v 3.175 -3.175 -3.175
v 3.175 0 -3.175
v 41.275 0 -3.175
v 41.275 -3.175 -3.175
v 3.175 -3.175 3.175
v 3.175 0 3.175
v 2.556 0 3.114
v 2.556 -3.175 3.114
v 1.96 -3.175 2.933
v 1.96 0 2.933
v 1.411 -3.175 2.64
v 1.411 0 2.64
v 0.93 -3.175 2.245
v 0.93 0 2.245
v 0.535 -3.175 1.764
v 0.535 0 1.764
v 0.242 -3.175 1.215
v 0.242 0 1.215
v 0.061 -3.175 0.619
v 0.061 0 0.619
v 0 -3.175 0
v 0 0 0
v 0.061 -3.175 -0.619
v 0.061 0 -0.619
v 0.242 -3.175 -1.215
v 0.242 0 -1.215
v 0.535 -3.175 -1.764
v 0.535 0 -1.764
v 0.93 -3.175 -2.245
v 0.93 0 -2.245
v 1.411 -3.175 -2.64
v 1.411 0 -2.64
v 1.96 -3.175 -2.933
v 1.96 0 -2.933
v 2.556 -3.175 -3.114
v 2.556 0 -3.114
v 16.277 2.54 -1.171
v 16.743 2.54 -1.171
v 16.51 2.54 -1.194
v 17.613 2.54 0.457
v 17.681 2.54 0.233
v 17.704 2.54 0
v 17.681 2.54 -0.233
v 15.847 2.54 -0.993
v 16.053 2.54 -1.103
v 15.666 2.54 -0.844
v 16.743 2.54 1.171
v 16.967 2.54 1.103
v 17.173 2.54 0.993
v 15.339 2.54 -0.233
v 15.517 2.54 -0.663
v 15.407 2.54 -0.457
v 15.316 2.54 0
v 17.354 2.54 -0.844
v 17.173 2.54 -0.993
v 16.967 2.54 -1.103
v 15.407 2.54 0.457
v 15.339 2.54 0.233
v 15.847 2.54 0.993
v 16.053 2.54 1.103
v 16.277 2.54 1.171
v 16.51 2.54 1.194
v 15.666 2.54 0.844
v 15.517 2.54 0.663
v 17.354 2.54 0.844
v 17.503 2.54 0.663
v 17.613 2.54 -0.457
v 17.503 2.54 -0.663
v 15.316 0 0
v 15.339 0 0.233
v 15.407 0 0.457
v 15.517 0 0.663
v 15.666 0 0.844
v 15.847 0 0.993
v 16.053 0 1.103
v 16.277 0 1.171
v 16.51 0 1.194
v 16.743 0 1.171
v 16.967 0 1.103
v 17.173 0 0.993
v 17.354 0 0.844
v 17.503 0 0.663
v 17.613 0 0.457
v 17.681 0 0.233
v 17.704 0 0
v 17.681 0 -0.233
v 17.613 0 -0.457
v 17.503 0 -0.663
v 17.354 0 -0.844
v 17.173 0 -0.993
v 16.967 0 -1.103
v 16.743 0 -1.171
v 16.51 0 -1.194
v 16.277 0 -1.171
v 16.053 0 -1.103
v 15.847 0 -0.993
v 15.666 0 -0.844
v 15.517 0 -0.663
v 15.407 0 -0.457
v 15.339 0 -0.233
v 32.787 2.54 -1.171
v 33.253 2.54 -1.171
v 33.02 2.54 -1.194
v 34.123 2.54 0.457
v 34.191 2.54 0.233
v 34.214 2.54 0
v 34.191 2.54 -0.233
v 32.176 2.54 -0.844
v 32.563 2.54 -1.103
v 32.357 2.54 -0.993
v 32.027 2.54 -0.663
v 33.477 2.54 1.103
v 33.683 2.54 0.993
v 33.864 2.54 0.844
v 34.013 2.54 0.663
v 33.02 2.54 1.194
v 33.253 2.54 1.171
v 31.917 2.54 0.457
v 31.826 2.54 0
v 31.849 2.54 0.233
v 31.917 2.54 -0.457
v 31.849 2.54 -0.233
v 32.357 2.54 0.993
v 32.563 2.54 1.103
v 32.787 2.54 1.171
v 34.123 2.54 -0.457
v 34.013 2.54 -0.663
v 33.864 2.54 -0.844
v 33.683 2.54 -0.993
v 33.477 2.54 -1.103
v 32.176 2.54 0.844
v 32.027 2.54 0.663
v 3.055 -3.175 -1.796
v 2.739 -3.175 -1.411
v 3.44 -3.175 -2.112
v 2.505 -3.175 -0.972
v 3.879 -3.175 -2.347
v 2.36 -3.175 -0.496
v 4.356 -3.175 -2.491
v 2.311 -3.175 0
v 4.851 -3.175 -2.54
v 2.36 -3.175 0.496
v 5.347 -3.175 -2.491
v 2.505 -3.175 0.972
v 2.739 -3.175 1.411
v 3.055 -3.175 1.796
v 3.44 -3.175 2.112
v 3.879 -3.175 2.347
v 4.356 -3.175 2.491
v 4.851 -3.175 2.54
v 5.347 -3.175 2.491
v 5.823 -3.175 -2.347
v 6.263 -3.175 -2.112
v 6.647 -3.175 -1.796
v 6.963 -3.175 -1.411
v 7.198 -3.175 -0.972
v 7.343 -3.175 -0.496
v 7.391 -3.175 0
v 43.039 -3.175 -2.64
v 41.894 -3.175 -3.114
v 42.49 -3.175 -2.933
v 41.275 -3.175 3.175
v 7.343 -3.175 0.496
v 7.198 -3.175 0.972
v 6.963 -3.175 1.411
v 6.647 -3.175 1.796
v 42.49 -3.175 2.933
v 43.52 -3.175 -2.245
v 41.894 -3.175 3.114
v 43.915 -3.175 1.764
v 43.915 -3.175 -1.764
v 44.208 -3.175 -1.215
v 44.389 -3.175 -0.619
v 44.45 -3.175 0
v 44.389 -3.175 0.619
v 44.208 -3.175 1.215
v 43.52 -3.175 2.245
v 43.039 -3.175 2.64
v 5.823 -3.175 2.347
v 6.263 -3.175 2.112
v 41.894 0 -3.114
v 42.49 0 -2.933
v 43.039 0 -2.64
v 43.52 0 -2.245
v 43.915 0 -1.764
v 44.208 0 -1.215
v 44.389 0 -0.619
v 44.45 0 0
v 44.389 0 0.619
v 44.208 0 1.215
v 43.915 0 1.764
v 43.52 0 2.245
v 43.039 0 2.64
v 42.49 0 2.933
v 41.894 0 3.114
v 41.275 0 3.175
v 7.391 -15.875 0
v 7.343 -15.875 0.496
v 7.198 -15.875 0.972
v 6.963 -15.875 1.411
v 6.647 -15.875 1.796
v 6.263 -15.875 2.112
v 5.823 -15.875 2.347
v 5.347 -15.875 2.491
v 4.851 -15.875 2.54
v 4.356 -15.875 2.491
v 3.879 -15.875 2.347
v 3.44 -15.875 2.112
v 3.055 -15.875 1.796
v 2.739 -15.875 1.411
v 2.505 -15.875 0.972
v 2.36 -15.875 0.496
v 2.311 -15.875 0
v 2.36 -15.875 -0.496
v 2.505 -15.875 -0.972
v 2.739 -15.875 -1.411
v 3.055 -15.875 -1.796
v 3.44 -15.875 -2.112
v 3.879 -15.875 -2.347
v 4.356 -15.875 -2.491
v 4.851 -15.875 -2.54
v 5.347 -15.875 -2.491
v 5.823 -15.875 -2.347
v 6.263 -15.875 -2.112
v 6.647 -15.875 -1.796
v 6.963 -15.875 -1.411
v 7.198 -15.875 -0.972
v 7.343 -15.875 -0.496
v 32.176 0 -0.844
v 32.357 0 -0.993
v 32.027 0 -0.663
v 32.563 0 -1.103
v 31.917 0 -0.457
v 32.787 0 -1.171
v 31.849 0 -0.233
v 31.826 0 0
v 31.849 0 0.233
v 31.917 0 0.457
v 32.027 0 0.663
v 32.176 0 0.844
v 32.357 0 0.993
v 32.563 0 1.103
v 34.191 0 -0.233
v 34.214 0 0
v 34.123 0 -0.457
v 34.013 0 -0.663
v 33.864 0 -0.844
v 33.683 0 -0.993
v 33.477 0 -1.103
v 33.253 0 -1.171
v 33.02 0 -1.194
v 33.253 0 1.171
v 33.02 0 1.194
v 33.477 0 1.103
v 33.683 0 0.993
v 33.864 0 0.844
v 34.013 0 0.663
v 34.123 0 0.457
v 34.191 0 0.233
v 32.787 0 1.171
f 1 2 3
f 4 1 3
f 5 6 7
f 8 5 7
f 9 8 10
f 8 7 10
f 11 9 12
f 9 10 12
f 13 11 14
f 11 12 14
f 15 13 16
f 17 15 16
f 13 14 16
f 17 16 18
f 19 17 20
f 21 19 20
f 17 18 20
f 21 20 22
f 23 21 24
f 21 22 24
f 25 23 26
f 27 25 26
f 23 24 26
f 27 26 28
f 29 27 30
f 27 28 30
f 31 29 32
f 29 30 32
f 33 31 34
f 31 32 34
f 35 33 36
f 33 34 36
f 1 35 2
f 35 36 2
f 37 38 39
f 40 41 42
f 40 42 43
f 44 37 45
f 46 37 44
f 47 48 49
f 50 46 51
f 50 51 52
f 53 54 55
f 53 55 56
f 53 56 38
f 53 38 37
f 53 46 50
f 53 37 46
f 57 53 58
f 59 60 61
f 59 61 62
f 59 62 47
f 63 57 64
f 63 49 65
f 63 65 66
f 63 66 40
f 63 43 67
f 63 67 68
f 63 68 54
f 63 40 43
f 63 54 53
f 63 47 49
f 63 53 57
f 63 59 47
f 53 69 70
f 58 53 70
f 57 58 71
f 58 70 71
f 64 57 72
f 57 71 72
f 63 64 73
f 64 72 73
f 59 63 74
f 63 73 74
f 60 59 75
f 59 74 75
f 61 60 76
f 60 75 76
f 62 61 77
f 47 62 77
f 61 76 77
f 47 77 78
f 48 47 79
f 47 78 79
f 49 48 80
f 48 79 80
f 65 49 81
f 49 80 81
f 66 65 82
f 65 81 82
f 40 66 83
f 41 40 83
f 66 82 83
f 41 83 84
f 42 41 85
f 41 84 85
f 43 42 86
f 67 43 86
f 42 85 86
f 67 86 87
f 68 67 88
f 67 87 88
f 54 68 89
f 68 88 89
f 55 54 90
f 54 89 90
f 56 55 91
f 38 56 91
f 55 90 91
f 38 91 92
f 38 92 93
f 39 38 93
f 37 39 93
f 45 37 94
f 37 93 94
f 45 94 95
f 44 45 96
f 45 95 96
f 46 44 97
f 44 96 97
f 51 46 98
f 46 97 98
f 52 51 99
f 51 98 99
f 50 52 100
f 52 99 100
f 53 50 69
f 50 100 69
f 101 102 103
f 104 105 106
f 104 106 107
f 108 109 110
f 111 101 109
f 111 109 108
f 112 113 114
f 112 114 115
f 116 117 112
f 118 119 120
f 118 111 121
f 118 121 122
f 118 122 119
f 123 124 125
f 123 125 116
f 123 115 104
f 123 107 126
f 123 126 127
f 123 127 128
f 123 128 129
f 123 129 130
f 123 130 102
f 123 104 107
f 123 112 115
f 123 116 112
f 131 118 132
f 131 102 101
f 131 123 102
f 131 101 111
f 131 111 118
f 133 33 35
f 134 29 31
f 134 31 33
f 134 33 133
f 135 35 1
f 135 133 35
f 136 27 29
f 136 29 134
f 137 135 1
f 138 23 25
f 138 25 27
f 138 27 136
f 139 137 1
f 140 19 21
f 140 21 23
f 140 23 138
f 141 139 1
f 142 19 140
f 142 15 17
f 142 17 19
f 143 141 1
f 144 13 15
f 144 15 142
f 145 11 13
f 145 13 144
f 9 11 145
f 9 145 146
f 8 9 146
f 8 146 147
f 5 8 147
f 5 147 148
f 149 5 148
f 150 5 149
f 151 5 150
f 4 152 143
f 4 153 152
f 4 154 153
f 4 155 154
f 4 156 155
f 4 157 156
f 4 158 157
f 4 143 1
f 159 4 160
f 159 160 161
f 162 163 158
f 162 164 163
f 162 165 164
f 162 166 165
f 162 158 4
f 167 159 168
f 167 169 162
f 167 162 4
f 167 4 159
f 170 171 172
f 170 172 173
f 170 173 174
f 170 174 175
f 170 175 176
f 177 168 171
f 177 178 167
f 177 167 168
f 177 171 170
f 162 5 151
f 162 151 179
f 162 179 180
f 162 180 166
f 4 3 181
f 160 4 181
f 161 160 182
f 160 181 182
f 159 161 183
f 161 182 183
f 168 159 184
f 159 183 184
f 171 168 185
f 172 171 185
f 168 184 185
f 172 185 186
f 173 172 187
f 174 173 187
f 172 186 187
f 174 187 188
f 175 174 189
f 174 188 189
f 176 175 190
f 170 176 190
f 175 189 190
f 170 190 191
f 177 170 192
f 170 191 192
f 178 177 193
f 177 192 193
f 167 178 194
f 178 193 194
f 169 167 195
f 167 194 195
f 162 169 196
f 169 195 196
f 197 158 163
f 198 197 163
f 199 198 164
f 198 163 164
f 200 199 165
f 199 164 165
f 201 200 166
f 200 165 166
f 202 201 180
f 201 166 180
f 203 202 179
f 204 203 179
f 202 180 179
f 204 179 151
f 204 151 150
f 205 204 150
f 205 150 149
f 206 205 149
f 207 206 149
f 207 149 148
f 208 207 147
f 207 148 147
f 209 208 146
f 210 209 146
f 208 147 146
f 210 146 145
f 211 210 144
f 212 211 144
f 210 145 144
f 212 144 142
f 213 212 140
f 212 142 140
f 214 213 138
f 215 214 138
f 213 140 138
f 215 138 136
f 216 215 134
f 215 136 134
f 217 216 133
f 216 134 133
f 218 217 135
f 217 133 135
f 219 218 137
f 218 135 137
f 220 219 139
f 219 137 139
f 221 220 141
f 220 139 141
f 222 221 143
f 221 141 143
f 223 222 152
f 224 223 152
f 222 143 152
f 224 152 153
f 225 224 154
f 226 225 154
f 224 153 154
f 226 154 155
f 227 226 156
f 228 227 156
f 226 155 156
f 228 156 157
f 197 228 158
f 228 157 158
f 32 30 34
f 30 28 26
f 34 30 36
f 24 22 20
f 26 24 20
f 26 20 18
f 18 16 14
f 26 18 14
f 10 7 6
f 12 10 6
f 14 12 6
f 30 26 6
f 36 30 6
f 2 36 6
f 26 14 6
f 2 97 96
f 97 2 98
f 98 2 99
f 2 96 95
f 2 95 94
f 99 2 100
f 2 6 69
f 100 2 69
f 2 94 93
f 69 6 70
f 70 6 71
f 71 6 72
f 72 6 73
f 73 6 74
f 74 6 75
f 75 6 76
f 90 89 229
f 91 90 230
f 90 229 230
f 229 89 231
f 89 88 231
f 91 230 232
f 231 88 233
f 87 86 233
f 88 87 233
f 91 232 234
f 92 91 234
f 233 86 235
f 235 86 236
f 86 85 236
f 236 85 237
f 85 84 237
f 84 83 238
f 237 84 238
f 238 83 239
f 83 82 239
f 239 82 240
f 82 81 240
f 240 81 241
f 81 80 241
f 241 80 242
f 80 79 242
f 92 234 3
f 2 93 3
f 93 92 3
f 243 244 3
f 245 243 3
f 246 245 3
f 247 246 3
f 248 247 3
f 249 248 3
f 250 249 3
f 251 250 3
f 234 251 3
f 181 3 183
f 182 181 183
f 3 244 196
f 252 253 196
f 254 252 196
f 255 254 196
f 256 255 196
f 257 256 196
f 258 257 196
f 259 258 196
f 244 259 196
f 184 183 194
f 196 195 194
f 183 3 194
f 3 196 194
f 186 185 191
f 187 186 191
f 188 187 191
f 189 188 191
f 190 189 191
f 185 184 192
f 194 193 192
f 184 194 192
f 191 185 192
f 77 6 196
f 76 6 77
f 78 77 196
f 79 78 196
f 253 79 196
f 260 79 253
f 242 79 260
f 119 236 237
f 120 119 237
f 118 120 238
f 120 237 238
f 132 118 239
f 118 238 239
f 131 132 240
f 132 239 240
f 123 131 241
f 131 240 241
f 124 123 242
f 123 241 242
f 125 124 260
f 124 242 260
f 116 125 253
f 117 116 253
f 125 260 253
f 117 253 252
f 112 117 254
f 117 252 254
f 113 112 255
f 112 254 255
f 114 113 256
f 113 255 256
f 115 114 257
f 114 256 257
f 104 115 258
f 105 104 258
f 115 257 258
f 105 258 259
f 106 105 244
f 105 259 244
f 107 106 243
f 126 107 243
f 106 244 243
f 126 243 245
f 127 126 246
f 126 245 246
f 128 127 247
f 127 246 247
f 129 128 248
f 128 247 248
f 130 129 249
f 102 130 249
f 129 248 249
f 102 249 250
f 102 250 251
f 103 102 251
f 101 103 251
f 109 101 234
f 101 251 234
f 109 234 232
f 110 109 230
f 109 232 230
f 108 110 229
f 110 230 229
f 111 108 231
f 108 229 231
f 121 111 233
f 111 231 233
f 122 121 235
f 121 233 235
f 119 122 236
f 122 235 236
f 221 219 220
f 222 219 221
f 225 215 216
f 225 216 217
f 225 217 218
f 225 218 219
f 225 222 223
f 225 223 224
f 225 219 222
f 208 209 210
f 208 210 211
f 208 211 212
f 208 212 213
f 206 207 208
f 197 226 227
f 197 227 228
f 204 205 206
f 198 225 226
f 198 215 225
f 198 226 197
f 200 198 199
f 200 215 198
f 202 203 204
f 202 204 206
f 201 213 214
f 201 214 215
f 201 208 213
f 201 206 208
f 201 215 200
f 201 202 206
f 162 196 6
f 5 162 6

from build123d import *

# Parameters (mm, degrees)
F1_DEPTH = 3.175
F2_R     = 2.54
F3_DEPTH = 12.7
F4_R     = 1.1938
F5_DEPTH = 2.54


with BuildPart() as f1:
    # F0 (on Front) → F1 (new body)
    with BuildSketch(Plane.XZ):
        with BuildLine():
            Line((41.275, 3.175), (3.175, 3.175))
            ThreePointArc((3.175, 3.175), (0, 0), (3.175, -3.175))
            Line((3.175, -3.175), (41.275, -3.175))
            ThreePointArc((41.275, -3.175), (44.45, 0), (41.275, 3.175))
        make_face()
    extrude(amount=F1_DEPTH)

    # F2 (on face) → F3 (join)
    with BuildSketch(Plane.XZ.offset(3.175)):
        with Locations((4.8514, 0)):
            Circle(F2_R)
    extrude(amount=F3_DEPTH)

    # F4 (on face) → F5 (join)
    with BuildSketch(Plane(origin=(0, 0, 0), x_dir=(-1, 0, 0), z_dir=(0, 1, 0))):
        with Locations((-16.51, 0)):
            Circle(F4_R)
        with Locations((-33.02, 0)):
            Circle(F4_R)
    extrude(amount=F5_DEPTH)


solid = f1.part
